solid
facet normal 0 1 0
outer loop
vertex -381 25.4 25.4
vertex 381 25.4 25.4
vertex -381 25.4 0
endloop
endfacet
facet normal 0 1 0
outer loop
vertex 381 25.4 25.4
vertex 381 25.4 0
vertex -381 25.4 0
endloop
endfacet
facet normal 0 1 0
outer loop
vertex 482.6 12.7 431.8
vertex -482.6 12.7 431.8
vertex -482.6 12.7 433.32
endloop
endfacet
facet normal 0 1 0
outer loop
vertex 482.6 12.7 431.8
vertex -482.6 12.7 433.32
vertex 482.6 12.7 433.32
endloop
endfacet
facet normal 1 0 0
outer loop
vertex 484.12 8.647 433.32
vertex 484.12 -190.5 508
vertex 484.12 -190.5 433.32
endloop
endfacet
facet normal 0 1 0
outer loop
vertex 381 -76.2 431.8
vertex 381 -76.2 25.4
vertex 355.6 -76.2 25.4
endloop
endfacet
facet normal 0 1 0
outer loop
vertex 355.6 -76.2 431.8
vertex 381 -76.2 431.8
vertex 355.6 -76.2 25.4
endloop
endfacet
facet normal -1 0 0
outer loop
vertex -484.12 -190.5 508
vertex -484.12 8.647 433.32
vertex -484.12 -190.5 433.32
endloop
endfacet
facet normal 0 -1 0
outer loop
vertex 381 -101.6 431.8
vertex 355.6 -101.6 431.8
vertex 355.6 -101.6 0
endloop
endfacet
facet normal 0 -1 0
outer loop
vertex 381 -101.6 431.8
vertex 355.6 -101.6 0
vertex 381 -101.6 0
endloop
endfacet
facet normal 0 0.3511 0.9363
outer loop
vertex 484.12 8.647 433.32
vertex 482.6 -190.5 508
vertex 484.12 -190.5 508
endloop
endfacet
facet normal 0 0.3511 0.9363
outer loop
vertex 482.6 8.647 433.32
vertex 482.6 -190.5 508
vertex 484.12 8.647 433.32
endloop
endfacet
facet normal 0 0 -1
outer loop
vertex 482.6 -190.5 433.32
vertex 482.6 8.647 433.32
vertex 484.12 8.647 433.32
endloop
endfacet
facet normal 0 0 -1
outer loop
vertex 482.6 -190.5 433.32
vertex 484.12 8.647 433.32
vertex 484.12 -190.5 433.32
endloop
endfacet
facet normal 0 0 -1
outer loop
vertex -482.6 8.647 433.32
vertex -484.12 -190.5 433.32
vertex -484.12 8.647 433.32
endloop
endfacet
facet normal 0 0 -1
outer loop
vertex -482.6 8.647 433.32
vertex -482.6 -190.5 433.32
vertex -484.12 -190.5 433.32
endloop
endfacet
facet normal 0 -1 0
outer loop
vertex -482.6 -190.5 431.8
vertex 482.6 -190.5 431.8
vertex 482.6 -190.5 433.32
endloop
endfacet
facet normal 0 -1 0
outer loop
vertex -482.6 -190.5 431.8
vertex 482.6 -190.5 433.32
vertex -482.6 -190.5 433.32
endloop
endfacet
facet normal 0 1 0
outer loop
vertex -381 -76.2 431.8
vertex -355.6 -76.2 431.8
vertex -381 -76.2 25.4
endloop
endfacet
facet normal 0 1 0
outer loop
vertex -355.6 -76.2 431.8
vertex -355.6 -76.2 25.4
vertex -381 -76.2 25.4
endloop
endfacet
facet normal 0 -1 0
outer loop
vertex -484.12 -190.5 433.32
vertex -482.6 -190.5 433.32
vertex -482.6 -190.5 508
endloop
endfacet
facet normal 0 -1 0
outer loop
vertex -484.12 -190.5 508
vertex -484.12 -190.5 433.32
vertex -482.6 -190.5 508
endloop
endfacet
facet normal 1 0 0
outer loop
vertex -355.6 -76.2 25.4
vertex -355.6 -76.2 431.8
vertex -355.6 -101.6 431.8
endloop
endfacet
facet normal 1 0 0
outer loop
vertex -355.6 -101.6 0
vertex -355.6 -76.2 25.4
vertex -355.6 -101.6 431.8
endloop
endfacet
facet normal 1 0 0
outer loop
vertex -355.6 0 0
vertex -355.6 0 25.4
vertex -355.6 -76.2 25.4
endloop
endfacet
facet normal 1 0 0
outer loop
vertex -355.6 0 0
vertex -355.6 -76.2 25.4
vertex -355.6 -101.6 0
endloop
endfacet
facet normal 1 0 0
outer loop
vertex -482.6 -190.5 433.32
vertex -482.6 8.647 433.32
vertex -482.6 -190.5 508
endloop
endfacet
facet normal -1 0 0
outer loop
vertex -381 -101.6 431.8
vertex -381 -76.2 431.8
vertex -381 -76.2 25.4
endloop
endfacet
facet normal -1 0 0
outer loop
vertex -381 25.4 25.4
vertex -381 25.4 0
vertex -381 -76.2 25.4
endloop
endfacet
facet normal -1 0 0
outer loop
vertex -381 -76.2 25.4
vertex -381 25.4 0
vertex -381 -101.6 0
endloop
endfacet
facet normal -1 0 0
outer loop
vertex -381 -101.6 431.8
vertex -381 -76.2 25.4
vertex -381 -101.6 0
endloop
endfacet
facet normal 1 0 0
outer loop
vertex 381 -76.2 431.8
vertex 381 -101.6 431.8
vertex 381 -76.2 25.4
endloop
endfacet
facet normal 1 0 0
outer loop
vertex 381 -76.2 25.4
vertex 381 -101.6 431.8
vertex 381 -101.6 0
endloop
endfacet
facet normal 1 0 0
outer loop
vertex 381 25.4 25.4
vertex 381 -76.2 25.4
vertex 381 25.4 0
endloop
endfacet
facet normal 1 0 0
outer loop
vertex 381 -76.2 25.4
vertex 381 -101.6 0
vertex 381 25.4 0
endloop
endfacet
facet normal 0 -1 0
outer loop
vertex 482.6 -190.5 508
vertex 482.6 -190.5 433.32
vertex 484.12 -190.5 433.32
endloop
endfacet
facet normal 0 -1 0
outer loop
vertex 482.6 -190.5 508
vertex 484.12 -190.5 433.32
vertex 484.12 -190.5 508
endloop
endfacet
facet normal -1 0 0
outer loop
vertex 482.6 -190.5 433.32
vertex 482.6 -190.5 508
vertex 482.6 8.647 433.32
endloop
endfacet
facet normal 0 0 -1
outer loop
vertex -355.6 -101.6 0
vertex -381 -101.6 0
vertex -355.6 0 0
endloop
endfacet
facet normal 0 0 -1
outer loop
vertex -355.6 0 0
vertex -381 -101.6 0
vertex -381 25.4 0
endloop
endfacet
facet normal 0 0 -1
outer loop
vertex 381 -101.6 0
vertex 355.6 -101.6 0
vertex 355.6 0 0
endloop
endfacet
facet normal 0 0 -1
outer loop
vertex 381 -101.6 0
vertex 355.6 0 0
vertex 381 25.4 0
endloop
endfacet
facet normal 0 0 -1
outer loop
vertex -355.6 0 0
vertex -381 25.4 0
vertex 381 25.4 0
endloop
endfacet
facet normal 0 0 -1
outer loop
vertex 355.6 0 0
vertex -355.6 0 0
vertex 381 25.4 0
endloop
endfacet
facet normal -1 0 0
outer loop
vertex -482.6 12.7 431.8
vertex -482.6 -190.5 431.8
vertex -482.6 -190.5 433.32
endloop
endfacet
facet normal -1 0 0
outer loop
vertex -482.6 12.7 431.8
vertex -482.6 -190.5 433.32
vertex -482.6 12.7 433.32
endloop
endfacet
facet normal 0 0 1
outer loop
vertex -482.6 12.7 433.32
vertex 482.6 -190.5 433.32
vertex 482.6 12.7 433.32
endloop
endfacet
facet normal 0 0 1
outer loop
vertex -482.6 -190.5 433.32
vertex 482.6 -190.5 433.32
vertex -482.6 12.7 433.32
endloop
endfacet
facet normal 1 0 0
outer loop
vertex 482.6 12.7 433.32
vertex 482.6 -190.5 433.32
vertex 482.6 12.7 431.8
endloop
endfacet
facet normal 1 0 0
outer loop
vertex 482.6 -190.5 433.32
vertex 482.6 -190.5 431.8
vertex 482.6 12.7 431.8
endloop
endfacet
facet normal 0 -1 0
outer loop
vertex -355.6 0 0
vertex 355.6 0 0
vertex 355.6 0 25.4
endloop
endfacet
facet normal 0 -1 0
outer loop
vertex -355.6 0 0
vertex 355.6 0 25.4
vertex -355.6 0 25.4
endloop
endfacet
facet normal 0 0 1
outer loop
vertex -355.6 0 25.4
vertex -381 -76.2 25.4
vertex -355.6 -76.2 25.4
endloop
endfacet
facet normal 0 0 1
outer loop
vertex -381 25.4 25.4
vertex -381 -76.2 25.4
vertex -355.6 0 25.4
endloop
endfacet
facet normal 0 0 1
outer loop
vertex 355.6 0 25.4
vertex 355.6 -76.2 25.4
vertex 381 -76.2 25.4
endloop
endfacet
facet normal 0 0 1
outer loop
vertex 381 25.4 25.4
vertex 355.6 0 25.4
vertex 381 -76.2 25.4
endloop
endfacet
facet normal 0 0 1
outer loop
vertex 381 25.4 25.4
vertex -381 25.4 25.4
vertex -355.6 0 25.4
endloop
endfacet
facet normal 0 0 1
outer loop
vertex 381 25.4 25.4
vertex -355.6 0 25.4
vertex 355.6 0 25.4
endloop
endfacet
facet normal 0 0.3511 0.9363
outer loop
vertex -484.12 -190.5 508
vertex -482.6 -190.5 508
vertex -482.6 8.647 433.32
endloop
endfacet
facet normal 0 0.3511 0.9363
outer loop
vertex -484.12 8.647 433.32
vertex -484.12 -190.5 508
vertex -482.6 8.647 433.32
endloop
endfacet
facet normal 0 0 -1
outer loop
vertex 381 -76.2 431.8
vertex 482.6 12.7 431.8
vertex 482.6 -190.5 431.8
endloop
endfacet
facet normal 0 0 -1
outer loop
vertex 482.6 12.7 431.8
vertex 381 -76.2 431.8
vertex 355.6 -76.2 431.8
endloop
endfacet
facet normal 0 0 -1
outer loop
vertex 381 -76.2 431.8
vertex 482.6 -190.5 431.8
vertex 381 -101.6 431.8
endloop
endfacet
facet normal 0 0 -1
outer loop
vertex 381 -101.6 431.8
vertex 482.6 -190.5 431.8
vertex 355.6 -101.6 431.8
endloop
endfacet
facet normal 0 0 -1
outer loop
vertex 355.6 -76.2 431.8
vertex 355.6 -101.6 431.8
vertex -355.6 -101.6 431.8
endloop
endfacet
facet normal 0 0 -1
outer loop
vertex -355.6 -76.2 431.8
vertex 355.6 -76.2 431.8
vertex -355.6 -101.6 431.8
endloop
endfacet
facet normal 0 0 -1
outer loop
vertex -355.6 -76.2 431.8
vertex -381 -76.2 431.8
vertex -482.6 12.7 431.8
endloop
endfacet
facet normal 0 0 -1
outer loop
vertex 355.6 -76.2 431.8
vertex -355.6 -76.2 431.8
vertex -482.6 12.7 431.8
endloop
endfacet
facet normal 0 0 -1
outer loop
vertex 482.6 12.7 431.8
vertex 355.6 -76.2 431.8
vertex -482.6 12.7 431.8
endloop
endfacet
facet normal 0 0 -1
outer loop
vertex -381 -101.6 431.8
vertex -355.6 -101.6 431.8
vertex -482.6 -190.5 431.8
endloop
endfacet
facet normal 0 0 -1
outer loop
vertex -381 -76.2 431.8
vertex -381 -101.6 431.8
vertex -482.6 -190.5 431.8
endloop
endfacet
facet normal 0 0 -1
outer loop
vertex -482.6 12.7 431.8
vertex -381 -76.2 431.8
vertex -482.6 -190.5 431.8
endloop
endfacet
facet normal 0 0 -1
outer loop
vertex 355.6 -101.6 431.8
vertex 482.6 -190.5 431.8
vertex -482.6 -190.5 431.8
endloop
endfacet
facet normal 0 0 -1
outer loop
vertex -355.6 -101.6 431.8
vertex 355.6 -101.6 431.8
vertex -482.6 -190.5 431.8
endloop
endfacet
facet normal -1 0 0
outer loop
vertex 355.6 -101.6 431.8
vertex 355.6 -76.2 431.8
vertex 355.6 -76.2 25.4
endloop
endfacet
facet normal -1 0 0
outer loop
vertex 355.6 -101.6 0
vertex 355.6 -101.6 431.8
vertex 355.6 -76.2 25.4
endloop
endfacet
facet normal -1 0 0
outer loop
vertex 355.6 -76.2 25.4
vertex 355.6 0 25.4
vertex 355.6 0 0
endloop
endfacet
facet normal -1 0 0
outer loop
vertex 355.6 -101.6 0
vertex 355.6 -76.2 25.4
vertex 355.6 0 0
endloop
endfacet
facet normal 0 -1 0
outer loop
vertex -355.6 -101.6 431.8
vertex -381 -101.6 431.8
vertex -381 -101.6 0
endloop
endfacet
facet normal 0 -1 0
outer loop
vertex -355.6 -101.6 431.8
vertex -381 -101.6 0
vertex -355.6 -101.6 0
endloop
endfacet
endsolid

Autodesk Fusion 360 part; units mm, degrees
sketch "Sketch1" plane through (0, 0, 0) normal (0, 0, 1) x (1, 0, 0)
  line L0 (381, 0) -> (-381, 0)
  line L1 (-381, 0) -> (381, 0)
  line L2 (381, 0) -> (381, 25.4)
  line L3 (381, 25.4) -> (-381, 25.4)
  line L4 (-381, 25.4) -> (-381, 0)
  dimension "d1" = 762
  dimension "d2" = 25.4
extrude "Extrude1" add sketch "Sketch1" along normal blind 25.4 makes body 1
sketch "Sketch3" plane through (0, 0, 0) normal (0, -1, 0) x (1, 0, 0)
  line L0 (-381, 0) -> (381, 0)
  line L1 (381, 0) -> (381, 25.4)
  line L2 (381, 25.4) -> (-381, 25.4)
  line L3 (-381, 25.4) -> (-381, 0)
  line L4 (-381, 25.4) -> (-355.6, 25.4)
  line L5 (-355.6, 25.4) -> (-355.6, 0)
  line L6 (-355.6, 0) -> (-381, 0)
  line L7 (-381, 0) -> (-381, 25.4)
  line L8 (381, 25.4) -> (355.6, 25.4)
  line L9 (355.6, 25.4) -> (355.6, 0)
  line L10 (355.6, 0) -> (381, 0)
  line L11 (381, 0) -> (381, 25.4)
  dimension "d7" = 25.4
  dimension "d8" = 25.4
extrude "Extrude2" add sketch "Sketch3" along normal blind 101.6 contours L0 L2 L3 L4 L5 L6 L7 | L0 L1 L2 L8 L9 L10 L11 bodies 1
sketch "Sketch4" plane through (0, 0, 25.4) normal (0, 0, 1) x (-1, 0, 0)
  line L0 (381, -25.4) -> (381, 101.6)
  line L1 (381, 101.6) -> (355.6, 101.6)
  line L2 (355.6, 101.6) -> (355.6, 0)
  line L3 (355.6, 0) -> (-355.6, 0)
  line L4 (-355.6, 0) -> (-355.6, 101.6)
  line L5 (-355.6, 101.6) -> (-381, 101.6)
  line L6 (-381, 101.6) -> (-381, -25.4)
  line L7 (-381, -25.4) -> (381, -25.4)
  line L8 (381, 101.6) -> (355.6, 101.6)
  line L9 (355.6, 101.6) -> (355.6, 76.2)
  line L10 (355.6, 76.2) -> (381, 76.2)
  line L11 (381, 76.2) -> (381, 101.6)
  line L12 (-355.6, 101.6) -> (-381, 101.6)
  line L13 (-381, 101.6) -> (-381, 76.2)
  line L14 (-381, 76.2) -> (-355.6, 76.2)
  line L15 (-355.6, 76.2) -> (-355.6, 101.6)
  dimension "d11" = 25.4
  dimension "d12" = 25.4
extrude "Extrude3" add sketch "Sketch4" along normal blind 406.4 contours L0 L1 L2 L8 L9 L10 L11 | L4 L5 L6 L12 L13 L14 L15 bodies 1
sketch "Sketch5" plane through (0, 0, 431.8) normal (0, 0, 1) x (-1, 0, 0)
  line L0 (381, 76.2) -> (381, 101.6)
  line L1 (381, 101.6) -> (355.6, 101.6)
  line L2 (355.6, 101.6) -> (355.6, 76.2)
  line L3 (355.6, 76.2) -> (381, 76.2)
  line L4 (381, 76.2) -> (381, -12.7)
  line L5 (381, 101.6) -> (381, 190.5)
  line L6 (381, 76.2) -> (381, 101.6)
  line L7 (381, 76.2) -> (381, 101.6)
  line L8 (381, -12.7) -> (-381, -12.7)
  line L9 (-381, -12.7) -> (-381, 190.5)
  line L10 (-381, 190.5) -> (381, 190.5)
  line L11 (-381, 190.5) -> (-482.6, 190.5)
  line L12 (-482.6, 190.5) -> (-482.6, -12.7)
  line L13 (-482.6, -12.7) -> (-381, -12.7)
  line L14 (-381, -12.7) -> (-381, 190.5)
  line L15 (381, 190.5) -> (482.6, 190.5)
  line L16 (482.6, 190.5) -> (482.6, -12.7)
  line L17 (482.6, -12.7) -> (381, -12.7)
  line L18 (381, -12.7) -> (381, 190.5)
  dimension "d15" = 88.9
  dimension "d16" = 88.9
  dimension "d17" = 762
  dimension "d18" = 203.2
  dimension "d27" = 203.2
  dimension "d28" = 101.6
  dimension "d29" = 101.6
extrude "Extrude4" add sketch "Sketch5" along normal blind 1.52 separate body contours L0 L1 L2 L3 L6 L7 L18 | L1 L2 L3 L4 L5 L8 L9 L10 L14 L18 makes body 2
extrude "Extrude7" add sketch "Sketch5" along normal blind 1.52 contours L0 L4 L5 L6 L7 L15 L16 L17 L18 | L9 L11 L12 L13 L14 bodies 1 2
sketch "Sketch9" plane through (482.6, 0, 0) normal (1, 0, 0) x (0, 1, 0)
  line L0 (-190.5, 431.8) -> (12.7, 431.8)
  line L1 (12.7, 431.8) -> (12.7, 433.32)
  line L2 (12.7, 433.32) -> (-190.5, 433.32)
  line L3 (-190.5, 433.32) -> (-190.5, 431.8)
  line L4 (-190.5, 431.8) -> (12.7, 431.8)
  line L5 (-190.5, 431.8) -> (-190.5, 508)
  line L6 (-190.5, 508) -> (12.7, 431.8)
  dimension "d32" = 76.2
sketch "Sketch10" plane through (-482.6, 0, 0) normal (-1, 0, 0) x (0, -1, 0)
  line L0 (-12.7, 431.8) -> (190.5, 431.8)
  line L1 (190.5, 431.8) -> (190.5, 433.32)
  line L2 (190.5, 433.32) -> (-12.7, 433.32)
  line L3 (-12.7, 433.32) -> (-12.7, 431.8)
  line L4 (-12.7, 431.8) -> (190.5, 431.8)
  line L5 (190.5, 431.8) -> (190.5, 508)
  line L6 (190.5, 508) -> (-12.7, 431.8)
  dimension "d33" = 76.2
extrude "Extrude8" add sketch "Sketch9" along normal blind 1.52 separate body contours L2 L5 L6 makes body 3
extrude "Extrude9" add sketch "Sketch10" along normal blind 1.52 separate body contours L2 L5 L6 makes body 4
